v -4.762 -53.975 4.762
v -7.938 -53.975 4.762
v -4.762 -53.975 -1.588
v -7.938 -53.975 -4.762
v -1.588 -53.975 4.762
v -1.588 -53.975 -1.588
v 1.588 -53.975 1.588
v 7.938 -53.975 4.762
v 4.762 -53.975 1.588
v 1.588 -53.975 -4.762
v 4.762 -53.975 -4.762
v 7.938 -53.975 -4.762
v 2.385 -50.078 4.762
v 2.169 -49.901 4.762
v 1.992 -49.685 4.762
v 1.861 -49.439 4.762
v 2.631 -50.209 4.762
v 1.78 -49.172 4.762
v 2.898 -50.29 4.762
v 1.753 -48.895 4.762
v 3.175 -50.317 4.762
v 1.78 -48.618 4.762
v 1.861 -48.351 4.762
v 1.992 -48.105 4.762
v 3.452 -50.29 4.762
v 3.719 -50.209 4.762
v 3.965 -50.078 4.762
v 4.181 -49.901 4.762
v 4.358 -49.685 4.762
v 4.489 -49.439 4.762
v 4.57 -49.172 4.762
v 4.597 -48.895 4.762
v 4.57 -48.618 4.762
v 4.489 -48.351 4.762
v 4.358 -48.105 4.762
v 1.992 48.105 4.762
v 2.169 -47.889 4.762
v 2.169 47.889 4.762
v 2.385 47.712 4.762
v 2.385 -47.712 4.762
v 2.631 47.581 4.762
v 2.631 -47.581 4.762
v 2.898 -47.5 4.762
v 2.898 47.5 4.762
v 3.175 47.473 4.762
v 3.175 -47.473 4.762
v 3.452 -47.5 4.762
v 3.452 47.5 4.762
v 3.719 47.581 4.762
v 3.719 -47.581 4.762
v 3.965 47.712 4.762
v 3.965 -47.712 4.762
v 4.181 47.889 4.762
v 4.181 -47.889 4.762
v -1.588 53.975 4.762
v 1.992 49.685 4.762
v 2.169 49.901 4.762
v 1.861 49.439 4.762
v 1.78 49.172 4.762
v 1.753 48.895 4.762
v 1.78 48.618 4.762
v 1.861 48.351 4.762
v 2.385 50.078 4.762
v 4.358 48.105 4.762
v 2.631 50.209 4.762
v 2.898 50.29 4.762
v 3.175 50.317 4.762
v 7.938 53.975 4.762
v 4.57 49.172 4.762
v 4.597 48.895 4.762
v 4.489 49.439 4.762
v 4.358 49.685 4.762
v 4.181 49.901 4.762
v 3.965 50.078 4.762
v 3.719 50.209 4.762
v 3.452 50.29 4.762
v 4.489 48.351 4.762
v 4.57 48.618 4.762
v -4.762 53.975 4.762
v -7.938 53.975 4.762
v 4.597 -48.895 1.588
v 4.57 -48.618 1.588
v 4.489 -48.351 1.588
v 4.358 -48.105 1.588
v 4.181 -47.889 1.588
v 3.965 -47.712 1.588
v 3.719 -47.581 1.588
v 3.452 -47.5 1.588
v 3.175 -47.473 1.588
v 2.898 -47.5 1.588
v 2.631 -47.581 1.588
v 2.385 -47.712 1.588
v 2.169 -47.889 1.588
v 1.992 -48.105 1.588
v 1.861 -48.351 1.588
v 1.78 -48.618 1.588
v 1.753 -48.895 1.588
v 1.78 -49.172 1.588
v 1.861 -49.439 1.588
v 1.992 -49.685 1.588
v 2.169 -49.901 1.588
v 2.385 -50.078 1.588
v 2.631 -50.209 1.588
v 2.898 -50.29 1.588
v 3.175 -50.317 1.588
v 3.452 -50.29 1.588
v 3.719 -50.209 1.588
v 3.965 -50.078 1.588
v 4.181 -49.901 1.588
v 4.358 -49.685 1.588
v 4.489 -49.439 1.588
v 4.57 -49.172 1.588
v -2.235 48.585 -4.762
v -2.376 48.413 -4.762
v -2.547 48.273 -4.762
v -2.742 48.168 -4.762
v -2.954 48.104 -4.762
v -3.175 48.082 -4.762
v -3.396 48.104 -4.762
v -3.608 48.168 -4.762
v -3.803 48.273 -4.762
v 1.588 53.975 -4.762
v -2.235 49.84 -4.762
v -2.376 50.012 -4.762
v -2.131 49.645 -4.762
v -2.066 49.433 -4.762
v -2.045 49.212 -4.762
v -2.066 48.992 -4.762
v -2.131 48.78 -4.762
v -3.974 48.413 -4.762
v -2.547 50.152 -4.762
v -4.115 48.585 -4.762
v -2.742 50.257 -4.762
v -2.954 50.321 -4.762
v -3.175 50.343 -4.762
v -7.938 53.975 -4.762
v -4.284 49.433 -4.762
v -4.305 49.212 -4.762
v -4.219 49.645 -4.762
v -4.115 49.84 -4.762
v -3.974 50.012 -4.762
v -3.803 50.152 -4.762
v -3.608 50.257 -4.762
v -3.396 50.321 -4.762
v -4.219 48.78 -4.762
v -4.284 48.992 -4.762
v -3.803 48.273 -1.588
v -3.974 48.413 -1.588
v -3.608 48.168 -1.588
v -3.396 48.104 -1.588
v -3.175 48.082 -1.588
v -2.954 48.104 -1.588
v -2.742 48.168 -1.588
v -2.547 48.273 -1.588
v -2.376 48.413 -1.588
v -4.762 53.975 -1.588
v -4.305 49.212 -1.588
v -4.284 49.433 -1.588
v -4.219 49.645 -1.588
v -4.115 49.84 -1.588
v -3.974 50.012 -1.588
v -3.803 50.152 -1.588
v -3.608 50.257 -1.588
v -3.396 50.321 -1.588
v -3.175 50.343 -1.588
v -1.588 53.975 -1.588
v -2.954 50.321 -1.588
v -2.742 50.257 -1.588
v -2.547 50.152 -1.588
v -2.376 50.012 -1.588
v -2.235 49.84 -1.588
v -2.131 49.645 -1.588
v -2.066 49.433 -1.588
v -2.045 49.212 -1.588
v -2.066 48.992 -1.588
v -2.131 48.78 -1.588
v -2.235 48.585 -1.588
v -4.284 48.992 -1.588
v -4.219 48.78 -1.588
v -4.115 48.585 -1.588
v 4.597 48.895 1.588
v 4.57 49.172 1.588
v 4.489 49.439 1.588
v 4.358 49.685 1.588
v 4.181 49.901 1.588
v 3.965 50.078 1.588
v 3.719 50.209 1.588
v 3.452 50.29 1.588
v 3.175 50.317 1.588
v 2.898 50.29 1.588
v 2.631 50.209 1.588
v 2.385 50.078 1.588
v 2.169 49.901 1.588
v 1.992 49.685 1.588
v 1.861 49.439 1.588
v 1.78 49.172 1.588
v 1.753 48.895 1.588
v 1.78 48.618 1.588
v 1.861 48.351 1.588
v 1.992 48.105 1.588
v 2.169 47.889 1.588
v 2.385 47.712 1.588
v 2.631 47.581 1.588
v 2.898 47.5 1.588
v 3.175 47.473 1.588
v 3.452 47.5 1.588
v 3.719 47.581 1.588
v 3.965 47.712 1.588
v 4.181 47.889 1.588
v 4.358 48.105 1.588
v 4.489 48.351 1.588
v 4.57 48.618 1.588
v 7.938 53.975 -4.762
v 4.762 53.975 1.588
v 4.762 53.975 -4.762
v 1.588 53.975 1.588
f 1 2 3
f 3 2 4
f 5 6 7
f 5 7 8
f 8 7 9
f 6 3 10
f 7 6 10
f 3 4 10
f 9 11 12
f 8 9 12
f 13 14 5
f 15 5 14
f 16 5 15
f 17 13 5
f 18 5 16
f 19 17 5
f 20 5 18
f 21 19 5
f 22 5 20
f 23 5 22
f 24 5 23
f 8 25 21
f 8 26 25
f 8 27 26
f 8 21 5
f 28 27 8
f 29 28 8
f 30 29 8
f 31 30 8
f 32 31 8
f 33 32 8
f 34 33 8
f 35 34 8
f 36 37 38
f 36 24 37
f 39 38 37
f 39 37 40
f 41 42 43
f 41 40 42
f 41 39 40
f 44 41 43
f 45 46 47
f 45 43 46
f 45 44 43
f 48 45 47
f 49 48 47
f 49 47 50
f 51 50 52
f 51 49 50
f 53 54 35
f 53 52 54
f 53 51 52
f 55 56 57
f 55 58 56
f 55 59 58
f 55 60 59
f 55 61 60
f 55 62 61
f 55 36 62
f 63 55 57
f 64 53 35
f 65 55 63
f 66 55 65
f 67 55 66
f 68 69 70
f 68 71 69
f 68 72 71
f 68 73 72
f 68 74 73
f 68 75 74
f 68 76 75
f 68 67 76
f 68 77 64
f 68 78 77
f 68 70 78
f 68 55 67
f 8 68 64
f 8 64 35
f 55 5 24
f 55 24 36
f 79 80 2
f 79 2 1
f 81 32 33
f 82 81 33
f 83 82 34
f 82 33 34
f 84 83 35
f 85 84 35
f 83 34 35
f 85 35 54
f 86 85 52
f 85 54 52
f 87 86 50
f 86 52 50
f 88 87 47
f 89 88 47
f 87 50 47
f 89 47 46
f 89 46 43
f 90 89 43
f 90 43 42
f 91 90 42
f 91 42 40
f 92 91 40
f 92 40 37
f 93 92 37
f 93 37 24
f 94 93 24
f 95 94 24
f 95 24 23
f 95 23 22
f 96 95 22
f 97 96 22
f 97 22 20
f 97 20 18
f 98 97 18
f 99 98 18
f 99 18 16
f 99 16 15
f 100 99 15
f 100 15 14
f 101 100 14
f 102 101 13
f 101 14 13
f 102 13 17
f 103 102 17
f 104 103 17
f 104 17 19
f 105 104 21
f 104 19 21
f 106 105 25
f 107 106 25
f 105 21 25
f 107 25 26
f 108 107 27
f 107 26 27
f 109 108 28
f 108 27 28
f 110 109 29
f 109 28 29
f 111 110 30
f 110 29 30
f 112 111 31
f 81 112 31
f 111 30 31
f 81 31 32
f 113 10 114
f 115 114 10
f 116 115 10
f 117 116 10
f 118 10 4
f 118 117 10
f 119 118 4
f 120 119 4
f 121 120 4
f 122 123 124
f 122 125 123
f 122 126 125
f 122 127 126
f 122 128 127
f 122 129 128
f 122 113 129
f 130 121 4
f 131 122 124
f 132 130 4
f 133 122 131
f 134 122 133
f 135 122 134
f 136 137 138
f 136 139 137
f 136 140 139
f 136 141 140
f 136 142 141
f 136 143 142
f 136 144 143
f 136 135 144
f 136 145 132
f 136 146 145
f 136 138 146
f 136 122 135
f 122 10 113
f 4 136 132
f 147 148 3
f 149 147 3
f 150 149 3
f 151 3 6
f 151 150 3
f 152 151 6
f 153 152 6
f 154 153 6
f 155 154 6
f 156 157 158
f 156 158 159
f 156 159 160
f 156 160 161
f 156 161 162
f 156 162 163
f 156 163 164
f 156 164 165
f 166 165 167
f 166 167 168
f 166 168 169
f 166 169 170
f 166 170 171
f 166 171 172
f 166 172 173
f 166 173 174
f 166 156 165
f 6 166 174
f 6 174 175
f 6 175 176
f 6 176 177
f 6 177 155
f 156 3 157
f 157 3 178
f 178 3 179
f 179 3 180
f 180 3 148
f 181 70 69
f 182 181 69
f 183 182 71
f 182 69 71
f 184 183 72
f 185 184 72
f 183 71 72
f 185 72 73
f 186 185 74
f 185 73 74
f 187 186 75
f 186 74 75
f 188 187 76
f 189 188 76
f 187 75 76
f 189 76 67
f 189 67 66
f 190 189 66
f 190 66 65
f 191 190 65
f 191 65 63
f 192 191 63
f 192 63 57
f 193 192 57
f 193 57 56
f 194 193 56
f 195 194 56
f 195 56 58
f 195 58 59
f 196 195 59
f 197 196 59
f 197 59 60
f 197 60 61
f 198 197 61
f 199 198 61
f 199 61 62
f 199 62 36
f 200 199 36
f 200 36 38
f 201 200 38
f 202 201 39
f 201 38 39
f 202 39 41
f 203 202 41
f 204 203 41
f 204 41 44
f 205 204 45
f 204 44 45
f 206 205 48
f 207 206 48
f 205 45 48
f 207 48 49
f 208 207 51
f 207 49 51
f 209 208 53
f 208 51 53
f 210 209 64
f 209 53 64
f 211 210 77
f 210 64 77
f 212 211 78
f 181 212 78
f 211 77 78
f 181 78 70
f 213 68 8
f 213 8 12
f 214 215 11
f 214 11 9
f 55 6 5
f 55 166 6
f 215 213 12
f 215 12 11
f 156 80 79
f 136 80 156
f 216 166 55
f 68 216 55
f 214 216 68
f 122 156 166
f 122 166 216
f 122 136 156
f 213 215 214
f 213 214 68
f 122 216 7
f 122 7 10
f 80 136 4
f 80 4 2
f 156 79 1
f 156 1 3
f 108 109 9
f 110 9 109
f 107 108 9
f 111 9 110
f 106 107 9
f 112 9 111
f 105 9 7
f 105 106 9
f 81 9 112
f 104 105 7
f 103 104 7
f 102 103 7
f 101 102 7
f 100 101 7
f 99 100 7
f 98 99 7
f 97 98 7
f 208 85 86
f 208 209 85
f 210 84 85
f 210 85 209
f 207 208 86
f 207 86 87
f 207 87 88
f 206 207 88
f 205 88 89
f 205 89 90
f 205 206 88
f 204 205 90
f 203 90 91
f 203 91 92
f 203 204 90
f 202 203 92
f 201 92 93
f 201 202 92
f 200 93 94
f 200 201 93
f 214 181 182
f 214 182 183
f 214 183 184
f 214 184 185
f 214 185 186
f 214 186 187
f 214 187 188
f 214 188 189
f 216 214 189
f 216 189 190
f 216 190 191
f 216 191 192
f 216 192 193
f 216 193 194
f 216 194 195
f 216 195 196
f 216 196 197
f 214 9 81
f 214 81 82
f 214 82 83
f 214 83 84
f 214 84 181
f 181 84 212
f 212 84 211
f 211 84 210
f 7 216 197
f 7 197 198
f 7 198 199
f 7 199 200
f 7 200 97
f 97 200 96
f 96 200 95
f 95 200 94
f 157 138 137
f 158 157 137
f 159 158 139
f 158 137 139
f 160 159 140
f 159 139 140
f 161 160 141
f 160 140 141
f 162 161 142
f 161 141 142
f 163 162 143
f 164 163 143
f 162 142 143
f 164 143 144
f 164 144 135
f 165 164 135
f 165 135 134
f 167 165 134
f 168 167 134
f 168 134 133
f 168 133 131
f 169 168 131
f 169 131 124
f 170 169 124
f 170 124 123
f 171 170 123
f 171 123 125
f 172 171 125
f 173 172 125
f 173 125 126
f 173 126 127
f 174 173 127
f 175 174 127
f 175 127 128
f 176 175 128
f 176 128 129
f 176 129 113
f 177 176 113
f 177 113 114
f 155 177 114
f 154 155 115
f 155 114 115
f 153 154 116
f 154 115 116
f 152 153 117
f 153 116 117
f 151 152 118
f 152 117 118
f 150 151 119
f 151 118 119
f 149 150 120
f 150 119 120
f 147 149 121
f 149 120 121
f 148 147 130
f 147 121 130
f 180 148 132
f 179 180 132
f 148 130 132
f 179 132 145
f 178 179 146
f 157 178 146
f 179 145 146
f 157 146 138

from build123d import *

# Parameters (mm, degrees)
EXTRUDE1_DEPTH                  = 53.975
SKETCH2_R                       = 1.1303
EXTRUDE2_DEPTH                  = 10.525
EXTRUDE3_REACH                  = 11.525
SKETCH3_R                       = 1.1303
F_4_40_TAPPED_HOLE1_D           = 2.2606
F_4_40_TAPPED_HOLE1_DEPTH       = 8.89
F_4_40_TAPPED_HOLE1_CBORE_D     = 2.8448
F_4_40_TAPPED_HOLE1_CBORE_DEPTH = 5.588
F_4_40_TAPPED_HOLE1_TIP         = 0.679152758


with BuildPart() as part:
    # Sketch1 → Extrude1 (new body, symmetric)
    with BuildSketch(Plane(origin=(0, 0, 0), x_dir=(1, 0, 0), z_dir=(0, 1, 0))):
        Polygon((-1.5875, -4.7625), (7.9375, -4.7625), (7.9375, 4.7625), (4.7625, 4.7625), (4.7625, -1.5875), (1.5875, -1.5875), (1.5875, 4.7625), (-7.9375, 4.7625), (-7.9375, -4.7625), (-4.7625, -4.7625), (-4.7625, 1.5875), (-1.5875, 1.5875), align=None)
    extrude(amount=EXTRUDE1_DEPTH, both=True)

    # Sketch2 → Extrude2 (cut, through all)
    with BuildSketch(Plane.XY.offset(4.7625)):
        with Locations((3.175, -48.895)):
            Circle(SKETCH2_R)
        with Locations((3.175, 48.895)):
            Circle(SKETCH2_R)
    extrude(amount=-EXTRUDE2_DEPTH, mode=Mode.SUBTRACT)

    # Sketch3 → Extrude3 (cut, up to next)
    with BuildSketch(Plane(origin=(0, 0, -4.7625), x_dir=(-1, 0, 0), z_dir=(0, 0, -1)), mode=Mode.PRIVATE) as extrude3_sk1:
        with Locations((3.175, 49.2125)):
            Circle(SKETCH3_R)
    extrude3_tool1 = extrude(extrude3_sk1.sketch, amount=-EXTRUDE3_REACH, mode=Mode.PRIVATE) & part.part
    add(extrude3_tool1.solids().sort_by_distance((-3.175, 49.2125, -4.7625))[0], mode=Mode.SUBTRACT)

    # #4-40 Tapped Hole1
    with Locations(Plane(origin=(3.175, 48.895, 4.7625), x_dir=(1, 0, 0), z_dir=(0, 0, 1))):
        with Locations((0, 0), (0, -97.79)):
            CounterBoreHole(F_4_40_TAPPED_HOLE1_D / 2, F_4_40_TAPPED_HOLE1_CBORE_D / 2, F_4_40_TAPPED_HOLE1_CBORE_DEPTH, depth=F_4_40_TAPPED_HOLE1_DEPTH)
            with Locations((0, 0, -(F_4_40_TAPPED_HOLE1_DEPTH + F_4_40_TAPPED_HOLE1_TIP / 2))):  # 118° drill point
                Cone(0, F_4_40_TAPPED_HOLE1_D / 2, F_4_40_TAPPED_HOLE1_TIP, mode=Mode.SUBTRACT)


solid = part.part
